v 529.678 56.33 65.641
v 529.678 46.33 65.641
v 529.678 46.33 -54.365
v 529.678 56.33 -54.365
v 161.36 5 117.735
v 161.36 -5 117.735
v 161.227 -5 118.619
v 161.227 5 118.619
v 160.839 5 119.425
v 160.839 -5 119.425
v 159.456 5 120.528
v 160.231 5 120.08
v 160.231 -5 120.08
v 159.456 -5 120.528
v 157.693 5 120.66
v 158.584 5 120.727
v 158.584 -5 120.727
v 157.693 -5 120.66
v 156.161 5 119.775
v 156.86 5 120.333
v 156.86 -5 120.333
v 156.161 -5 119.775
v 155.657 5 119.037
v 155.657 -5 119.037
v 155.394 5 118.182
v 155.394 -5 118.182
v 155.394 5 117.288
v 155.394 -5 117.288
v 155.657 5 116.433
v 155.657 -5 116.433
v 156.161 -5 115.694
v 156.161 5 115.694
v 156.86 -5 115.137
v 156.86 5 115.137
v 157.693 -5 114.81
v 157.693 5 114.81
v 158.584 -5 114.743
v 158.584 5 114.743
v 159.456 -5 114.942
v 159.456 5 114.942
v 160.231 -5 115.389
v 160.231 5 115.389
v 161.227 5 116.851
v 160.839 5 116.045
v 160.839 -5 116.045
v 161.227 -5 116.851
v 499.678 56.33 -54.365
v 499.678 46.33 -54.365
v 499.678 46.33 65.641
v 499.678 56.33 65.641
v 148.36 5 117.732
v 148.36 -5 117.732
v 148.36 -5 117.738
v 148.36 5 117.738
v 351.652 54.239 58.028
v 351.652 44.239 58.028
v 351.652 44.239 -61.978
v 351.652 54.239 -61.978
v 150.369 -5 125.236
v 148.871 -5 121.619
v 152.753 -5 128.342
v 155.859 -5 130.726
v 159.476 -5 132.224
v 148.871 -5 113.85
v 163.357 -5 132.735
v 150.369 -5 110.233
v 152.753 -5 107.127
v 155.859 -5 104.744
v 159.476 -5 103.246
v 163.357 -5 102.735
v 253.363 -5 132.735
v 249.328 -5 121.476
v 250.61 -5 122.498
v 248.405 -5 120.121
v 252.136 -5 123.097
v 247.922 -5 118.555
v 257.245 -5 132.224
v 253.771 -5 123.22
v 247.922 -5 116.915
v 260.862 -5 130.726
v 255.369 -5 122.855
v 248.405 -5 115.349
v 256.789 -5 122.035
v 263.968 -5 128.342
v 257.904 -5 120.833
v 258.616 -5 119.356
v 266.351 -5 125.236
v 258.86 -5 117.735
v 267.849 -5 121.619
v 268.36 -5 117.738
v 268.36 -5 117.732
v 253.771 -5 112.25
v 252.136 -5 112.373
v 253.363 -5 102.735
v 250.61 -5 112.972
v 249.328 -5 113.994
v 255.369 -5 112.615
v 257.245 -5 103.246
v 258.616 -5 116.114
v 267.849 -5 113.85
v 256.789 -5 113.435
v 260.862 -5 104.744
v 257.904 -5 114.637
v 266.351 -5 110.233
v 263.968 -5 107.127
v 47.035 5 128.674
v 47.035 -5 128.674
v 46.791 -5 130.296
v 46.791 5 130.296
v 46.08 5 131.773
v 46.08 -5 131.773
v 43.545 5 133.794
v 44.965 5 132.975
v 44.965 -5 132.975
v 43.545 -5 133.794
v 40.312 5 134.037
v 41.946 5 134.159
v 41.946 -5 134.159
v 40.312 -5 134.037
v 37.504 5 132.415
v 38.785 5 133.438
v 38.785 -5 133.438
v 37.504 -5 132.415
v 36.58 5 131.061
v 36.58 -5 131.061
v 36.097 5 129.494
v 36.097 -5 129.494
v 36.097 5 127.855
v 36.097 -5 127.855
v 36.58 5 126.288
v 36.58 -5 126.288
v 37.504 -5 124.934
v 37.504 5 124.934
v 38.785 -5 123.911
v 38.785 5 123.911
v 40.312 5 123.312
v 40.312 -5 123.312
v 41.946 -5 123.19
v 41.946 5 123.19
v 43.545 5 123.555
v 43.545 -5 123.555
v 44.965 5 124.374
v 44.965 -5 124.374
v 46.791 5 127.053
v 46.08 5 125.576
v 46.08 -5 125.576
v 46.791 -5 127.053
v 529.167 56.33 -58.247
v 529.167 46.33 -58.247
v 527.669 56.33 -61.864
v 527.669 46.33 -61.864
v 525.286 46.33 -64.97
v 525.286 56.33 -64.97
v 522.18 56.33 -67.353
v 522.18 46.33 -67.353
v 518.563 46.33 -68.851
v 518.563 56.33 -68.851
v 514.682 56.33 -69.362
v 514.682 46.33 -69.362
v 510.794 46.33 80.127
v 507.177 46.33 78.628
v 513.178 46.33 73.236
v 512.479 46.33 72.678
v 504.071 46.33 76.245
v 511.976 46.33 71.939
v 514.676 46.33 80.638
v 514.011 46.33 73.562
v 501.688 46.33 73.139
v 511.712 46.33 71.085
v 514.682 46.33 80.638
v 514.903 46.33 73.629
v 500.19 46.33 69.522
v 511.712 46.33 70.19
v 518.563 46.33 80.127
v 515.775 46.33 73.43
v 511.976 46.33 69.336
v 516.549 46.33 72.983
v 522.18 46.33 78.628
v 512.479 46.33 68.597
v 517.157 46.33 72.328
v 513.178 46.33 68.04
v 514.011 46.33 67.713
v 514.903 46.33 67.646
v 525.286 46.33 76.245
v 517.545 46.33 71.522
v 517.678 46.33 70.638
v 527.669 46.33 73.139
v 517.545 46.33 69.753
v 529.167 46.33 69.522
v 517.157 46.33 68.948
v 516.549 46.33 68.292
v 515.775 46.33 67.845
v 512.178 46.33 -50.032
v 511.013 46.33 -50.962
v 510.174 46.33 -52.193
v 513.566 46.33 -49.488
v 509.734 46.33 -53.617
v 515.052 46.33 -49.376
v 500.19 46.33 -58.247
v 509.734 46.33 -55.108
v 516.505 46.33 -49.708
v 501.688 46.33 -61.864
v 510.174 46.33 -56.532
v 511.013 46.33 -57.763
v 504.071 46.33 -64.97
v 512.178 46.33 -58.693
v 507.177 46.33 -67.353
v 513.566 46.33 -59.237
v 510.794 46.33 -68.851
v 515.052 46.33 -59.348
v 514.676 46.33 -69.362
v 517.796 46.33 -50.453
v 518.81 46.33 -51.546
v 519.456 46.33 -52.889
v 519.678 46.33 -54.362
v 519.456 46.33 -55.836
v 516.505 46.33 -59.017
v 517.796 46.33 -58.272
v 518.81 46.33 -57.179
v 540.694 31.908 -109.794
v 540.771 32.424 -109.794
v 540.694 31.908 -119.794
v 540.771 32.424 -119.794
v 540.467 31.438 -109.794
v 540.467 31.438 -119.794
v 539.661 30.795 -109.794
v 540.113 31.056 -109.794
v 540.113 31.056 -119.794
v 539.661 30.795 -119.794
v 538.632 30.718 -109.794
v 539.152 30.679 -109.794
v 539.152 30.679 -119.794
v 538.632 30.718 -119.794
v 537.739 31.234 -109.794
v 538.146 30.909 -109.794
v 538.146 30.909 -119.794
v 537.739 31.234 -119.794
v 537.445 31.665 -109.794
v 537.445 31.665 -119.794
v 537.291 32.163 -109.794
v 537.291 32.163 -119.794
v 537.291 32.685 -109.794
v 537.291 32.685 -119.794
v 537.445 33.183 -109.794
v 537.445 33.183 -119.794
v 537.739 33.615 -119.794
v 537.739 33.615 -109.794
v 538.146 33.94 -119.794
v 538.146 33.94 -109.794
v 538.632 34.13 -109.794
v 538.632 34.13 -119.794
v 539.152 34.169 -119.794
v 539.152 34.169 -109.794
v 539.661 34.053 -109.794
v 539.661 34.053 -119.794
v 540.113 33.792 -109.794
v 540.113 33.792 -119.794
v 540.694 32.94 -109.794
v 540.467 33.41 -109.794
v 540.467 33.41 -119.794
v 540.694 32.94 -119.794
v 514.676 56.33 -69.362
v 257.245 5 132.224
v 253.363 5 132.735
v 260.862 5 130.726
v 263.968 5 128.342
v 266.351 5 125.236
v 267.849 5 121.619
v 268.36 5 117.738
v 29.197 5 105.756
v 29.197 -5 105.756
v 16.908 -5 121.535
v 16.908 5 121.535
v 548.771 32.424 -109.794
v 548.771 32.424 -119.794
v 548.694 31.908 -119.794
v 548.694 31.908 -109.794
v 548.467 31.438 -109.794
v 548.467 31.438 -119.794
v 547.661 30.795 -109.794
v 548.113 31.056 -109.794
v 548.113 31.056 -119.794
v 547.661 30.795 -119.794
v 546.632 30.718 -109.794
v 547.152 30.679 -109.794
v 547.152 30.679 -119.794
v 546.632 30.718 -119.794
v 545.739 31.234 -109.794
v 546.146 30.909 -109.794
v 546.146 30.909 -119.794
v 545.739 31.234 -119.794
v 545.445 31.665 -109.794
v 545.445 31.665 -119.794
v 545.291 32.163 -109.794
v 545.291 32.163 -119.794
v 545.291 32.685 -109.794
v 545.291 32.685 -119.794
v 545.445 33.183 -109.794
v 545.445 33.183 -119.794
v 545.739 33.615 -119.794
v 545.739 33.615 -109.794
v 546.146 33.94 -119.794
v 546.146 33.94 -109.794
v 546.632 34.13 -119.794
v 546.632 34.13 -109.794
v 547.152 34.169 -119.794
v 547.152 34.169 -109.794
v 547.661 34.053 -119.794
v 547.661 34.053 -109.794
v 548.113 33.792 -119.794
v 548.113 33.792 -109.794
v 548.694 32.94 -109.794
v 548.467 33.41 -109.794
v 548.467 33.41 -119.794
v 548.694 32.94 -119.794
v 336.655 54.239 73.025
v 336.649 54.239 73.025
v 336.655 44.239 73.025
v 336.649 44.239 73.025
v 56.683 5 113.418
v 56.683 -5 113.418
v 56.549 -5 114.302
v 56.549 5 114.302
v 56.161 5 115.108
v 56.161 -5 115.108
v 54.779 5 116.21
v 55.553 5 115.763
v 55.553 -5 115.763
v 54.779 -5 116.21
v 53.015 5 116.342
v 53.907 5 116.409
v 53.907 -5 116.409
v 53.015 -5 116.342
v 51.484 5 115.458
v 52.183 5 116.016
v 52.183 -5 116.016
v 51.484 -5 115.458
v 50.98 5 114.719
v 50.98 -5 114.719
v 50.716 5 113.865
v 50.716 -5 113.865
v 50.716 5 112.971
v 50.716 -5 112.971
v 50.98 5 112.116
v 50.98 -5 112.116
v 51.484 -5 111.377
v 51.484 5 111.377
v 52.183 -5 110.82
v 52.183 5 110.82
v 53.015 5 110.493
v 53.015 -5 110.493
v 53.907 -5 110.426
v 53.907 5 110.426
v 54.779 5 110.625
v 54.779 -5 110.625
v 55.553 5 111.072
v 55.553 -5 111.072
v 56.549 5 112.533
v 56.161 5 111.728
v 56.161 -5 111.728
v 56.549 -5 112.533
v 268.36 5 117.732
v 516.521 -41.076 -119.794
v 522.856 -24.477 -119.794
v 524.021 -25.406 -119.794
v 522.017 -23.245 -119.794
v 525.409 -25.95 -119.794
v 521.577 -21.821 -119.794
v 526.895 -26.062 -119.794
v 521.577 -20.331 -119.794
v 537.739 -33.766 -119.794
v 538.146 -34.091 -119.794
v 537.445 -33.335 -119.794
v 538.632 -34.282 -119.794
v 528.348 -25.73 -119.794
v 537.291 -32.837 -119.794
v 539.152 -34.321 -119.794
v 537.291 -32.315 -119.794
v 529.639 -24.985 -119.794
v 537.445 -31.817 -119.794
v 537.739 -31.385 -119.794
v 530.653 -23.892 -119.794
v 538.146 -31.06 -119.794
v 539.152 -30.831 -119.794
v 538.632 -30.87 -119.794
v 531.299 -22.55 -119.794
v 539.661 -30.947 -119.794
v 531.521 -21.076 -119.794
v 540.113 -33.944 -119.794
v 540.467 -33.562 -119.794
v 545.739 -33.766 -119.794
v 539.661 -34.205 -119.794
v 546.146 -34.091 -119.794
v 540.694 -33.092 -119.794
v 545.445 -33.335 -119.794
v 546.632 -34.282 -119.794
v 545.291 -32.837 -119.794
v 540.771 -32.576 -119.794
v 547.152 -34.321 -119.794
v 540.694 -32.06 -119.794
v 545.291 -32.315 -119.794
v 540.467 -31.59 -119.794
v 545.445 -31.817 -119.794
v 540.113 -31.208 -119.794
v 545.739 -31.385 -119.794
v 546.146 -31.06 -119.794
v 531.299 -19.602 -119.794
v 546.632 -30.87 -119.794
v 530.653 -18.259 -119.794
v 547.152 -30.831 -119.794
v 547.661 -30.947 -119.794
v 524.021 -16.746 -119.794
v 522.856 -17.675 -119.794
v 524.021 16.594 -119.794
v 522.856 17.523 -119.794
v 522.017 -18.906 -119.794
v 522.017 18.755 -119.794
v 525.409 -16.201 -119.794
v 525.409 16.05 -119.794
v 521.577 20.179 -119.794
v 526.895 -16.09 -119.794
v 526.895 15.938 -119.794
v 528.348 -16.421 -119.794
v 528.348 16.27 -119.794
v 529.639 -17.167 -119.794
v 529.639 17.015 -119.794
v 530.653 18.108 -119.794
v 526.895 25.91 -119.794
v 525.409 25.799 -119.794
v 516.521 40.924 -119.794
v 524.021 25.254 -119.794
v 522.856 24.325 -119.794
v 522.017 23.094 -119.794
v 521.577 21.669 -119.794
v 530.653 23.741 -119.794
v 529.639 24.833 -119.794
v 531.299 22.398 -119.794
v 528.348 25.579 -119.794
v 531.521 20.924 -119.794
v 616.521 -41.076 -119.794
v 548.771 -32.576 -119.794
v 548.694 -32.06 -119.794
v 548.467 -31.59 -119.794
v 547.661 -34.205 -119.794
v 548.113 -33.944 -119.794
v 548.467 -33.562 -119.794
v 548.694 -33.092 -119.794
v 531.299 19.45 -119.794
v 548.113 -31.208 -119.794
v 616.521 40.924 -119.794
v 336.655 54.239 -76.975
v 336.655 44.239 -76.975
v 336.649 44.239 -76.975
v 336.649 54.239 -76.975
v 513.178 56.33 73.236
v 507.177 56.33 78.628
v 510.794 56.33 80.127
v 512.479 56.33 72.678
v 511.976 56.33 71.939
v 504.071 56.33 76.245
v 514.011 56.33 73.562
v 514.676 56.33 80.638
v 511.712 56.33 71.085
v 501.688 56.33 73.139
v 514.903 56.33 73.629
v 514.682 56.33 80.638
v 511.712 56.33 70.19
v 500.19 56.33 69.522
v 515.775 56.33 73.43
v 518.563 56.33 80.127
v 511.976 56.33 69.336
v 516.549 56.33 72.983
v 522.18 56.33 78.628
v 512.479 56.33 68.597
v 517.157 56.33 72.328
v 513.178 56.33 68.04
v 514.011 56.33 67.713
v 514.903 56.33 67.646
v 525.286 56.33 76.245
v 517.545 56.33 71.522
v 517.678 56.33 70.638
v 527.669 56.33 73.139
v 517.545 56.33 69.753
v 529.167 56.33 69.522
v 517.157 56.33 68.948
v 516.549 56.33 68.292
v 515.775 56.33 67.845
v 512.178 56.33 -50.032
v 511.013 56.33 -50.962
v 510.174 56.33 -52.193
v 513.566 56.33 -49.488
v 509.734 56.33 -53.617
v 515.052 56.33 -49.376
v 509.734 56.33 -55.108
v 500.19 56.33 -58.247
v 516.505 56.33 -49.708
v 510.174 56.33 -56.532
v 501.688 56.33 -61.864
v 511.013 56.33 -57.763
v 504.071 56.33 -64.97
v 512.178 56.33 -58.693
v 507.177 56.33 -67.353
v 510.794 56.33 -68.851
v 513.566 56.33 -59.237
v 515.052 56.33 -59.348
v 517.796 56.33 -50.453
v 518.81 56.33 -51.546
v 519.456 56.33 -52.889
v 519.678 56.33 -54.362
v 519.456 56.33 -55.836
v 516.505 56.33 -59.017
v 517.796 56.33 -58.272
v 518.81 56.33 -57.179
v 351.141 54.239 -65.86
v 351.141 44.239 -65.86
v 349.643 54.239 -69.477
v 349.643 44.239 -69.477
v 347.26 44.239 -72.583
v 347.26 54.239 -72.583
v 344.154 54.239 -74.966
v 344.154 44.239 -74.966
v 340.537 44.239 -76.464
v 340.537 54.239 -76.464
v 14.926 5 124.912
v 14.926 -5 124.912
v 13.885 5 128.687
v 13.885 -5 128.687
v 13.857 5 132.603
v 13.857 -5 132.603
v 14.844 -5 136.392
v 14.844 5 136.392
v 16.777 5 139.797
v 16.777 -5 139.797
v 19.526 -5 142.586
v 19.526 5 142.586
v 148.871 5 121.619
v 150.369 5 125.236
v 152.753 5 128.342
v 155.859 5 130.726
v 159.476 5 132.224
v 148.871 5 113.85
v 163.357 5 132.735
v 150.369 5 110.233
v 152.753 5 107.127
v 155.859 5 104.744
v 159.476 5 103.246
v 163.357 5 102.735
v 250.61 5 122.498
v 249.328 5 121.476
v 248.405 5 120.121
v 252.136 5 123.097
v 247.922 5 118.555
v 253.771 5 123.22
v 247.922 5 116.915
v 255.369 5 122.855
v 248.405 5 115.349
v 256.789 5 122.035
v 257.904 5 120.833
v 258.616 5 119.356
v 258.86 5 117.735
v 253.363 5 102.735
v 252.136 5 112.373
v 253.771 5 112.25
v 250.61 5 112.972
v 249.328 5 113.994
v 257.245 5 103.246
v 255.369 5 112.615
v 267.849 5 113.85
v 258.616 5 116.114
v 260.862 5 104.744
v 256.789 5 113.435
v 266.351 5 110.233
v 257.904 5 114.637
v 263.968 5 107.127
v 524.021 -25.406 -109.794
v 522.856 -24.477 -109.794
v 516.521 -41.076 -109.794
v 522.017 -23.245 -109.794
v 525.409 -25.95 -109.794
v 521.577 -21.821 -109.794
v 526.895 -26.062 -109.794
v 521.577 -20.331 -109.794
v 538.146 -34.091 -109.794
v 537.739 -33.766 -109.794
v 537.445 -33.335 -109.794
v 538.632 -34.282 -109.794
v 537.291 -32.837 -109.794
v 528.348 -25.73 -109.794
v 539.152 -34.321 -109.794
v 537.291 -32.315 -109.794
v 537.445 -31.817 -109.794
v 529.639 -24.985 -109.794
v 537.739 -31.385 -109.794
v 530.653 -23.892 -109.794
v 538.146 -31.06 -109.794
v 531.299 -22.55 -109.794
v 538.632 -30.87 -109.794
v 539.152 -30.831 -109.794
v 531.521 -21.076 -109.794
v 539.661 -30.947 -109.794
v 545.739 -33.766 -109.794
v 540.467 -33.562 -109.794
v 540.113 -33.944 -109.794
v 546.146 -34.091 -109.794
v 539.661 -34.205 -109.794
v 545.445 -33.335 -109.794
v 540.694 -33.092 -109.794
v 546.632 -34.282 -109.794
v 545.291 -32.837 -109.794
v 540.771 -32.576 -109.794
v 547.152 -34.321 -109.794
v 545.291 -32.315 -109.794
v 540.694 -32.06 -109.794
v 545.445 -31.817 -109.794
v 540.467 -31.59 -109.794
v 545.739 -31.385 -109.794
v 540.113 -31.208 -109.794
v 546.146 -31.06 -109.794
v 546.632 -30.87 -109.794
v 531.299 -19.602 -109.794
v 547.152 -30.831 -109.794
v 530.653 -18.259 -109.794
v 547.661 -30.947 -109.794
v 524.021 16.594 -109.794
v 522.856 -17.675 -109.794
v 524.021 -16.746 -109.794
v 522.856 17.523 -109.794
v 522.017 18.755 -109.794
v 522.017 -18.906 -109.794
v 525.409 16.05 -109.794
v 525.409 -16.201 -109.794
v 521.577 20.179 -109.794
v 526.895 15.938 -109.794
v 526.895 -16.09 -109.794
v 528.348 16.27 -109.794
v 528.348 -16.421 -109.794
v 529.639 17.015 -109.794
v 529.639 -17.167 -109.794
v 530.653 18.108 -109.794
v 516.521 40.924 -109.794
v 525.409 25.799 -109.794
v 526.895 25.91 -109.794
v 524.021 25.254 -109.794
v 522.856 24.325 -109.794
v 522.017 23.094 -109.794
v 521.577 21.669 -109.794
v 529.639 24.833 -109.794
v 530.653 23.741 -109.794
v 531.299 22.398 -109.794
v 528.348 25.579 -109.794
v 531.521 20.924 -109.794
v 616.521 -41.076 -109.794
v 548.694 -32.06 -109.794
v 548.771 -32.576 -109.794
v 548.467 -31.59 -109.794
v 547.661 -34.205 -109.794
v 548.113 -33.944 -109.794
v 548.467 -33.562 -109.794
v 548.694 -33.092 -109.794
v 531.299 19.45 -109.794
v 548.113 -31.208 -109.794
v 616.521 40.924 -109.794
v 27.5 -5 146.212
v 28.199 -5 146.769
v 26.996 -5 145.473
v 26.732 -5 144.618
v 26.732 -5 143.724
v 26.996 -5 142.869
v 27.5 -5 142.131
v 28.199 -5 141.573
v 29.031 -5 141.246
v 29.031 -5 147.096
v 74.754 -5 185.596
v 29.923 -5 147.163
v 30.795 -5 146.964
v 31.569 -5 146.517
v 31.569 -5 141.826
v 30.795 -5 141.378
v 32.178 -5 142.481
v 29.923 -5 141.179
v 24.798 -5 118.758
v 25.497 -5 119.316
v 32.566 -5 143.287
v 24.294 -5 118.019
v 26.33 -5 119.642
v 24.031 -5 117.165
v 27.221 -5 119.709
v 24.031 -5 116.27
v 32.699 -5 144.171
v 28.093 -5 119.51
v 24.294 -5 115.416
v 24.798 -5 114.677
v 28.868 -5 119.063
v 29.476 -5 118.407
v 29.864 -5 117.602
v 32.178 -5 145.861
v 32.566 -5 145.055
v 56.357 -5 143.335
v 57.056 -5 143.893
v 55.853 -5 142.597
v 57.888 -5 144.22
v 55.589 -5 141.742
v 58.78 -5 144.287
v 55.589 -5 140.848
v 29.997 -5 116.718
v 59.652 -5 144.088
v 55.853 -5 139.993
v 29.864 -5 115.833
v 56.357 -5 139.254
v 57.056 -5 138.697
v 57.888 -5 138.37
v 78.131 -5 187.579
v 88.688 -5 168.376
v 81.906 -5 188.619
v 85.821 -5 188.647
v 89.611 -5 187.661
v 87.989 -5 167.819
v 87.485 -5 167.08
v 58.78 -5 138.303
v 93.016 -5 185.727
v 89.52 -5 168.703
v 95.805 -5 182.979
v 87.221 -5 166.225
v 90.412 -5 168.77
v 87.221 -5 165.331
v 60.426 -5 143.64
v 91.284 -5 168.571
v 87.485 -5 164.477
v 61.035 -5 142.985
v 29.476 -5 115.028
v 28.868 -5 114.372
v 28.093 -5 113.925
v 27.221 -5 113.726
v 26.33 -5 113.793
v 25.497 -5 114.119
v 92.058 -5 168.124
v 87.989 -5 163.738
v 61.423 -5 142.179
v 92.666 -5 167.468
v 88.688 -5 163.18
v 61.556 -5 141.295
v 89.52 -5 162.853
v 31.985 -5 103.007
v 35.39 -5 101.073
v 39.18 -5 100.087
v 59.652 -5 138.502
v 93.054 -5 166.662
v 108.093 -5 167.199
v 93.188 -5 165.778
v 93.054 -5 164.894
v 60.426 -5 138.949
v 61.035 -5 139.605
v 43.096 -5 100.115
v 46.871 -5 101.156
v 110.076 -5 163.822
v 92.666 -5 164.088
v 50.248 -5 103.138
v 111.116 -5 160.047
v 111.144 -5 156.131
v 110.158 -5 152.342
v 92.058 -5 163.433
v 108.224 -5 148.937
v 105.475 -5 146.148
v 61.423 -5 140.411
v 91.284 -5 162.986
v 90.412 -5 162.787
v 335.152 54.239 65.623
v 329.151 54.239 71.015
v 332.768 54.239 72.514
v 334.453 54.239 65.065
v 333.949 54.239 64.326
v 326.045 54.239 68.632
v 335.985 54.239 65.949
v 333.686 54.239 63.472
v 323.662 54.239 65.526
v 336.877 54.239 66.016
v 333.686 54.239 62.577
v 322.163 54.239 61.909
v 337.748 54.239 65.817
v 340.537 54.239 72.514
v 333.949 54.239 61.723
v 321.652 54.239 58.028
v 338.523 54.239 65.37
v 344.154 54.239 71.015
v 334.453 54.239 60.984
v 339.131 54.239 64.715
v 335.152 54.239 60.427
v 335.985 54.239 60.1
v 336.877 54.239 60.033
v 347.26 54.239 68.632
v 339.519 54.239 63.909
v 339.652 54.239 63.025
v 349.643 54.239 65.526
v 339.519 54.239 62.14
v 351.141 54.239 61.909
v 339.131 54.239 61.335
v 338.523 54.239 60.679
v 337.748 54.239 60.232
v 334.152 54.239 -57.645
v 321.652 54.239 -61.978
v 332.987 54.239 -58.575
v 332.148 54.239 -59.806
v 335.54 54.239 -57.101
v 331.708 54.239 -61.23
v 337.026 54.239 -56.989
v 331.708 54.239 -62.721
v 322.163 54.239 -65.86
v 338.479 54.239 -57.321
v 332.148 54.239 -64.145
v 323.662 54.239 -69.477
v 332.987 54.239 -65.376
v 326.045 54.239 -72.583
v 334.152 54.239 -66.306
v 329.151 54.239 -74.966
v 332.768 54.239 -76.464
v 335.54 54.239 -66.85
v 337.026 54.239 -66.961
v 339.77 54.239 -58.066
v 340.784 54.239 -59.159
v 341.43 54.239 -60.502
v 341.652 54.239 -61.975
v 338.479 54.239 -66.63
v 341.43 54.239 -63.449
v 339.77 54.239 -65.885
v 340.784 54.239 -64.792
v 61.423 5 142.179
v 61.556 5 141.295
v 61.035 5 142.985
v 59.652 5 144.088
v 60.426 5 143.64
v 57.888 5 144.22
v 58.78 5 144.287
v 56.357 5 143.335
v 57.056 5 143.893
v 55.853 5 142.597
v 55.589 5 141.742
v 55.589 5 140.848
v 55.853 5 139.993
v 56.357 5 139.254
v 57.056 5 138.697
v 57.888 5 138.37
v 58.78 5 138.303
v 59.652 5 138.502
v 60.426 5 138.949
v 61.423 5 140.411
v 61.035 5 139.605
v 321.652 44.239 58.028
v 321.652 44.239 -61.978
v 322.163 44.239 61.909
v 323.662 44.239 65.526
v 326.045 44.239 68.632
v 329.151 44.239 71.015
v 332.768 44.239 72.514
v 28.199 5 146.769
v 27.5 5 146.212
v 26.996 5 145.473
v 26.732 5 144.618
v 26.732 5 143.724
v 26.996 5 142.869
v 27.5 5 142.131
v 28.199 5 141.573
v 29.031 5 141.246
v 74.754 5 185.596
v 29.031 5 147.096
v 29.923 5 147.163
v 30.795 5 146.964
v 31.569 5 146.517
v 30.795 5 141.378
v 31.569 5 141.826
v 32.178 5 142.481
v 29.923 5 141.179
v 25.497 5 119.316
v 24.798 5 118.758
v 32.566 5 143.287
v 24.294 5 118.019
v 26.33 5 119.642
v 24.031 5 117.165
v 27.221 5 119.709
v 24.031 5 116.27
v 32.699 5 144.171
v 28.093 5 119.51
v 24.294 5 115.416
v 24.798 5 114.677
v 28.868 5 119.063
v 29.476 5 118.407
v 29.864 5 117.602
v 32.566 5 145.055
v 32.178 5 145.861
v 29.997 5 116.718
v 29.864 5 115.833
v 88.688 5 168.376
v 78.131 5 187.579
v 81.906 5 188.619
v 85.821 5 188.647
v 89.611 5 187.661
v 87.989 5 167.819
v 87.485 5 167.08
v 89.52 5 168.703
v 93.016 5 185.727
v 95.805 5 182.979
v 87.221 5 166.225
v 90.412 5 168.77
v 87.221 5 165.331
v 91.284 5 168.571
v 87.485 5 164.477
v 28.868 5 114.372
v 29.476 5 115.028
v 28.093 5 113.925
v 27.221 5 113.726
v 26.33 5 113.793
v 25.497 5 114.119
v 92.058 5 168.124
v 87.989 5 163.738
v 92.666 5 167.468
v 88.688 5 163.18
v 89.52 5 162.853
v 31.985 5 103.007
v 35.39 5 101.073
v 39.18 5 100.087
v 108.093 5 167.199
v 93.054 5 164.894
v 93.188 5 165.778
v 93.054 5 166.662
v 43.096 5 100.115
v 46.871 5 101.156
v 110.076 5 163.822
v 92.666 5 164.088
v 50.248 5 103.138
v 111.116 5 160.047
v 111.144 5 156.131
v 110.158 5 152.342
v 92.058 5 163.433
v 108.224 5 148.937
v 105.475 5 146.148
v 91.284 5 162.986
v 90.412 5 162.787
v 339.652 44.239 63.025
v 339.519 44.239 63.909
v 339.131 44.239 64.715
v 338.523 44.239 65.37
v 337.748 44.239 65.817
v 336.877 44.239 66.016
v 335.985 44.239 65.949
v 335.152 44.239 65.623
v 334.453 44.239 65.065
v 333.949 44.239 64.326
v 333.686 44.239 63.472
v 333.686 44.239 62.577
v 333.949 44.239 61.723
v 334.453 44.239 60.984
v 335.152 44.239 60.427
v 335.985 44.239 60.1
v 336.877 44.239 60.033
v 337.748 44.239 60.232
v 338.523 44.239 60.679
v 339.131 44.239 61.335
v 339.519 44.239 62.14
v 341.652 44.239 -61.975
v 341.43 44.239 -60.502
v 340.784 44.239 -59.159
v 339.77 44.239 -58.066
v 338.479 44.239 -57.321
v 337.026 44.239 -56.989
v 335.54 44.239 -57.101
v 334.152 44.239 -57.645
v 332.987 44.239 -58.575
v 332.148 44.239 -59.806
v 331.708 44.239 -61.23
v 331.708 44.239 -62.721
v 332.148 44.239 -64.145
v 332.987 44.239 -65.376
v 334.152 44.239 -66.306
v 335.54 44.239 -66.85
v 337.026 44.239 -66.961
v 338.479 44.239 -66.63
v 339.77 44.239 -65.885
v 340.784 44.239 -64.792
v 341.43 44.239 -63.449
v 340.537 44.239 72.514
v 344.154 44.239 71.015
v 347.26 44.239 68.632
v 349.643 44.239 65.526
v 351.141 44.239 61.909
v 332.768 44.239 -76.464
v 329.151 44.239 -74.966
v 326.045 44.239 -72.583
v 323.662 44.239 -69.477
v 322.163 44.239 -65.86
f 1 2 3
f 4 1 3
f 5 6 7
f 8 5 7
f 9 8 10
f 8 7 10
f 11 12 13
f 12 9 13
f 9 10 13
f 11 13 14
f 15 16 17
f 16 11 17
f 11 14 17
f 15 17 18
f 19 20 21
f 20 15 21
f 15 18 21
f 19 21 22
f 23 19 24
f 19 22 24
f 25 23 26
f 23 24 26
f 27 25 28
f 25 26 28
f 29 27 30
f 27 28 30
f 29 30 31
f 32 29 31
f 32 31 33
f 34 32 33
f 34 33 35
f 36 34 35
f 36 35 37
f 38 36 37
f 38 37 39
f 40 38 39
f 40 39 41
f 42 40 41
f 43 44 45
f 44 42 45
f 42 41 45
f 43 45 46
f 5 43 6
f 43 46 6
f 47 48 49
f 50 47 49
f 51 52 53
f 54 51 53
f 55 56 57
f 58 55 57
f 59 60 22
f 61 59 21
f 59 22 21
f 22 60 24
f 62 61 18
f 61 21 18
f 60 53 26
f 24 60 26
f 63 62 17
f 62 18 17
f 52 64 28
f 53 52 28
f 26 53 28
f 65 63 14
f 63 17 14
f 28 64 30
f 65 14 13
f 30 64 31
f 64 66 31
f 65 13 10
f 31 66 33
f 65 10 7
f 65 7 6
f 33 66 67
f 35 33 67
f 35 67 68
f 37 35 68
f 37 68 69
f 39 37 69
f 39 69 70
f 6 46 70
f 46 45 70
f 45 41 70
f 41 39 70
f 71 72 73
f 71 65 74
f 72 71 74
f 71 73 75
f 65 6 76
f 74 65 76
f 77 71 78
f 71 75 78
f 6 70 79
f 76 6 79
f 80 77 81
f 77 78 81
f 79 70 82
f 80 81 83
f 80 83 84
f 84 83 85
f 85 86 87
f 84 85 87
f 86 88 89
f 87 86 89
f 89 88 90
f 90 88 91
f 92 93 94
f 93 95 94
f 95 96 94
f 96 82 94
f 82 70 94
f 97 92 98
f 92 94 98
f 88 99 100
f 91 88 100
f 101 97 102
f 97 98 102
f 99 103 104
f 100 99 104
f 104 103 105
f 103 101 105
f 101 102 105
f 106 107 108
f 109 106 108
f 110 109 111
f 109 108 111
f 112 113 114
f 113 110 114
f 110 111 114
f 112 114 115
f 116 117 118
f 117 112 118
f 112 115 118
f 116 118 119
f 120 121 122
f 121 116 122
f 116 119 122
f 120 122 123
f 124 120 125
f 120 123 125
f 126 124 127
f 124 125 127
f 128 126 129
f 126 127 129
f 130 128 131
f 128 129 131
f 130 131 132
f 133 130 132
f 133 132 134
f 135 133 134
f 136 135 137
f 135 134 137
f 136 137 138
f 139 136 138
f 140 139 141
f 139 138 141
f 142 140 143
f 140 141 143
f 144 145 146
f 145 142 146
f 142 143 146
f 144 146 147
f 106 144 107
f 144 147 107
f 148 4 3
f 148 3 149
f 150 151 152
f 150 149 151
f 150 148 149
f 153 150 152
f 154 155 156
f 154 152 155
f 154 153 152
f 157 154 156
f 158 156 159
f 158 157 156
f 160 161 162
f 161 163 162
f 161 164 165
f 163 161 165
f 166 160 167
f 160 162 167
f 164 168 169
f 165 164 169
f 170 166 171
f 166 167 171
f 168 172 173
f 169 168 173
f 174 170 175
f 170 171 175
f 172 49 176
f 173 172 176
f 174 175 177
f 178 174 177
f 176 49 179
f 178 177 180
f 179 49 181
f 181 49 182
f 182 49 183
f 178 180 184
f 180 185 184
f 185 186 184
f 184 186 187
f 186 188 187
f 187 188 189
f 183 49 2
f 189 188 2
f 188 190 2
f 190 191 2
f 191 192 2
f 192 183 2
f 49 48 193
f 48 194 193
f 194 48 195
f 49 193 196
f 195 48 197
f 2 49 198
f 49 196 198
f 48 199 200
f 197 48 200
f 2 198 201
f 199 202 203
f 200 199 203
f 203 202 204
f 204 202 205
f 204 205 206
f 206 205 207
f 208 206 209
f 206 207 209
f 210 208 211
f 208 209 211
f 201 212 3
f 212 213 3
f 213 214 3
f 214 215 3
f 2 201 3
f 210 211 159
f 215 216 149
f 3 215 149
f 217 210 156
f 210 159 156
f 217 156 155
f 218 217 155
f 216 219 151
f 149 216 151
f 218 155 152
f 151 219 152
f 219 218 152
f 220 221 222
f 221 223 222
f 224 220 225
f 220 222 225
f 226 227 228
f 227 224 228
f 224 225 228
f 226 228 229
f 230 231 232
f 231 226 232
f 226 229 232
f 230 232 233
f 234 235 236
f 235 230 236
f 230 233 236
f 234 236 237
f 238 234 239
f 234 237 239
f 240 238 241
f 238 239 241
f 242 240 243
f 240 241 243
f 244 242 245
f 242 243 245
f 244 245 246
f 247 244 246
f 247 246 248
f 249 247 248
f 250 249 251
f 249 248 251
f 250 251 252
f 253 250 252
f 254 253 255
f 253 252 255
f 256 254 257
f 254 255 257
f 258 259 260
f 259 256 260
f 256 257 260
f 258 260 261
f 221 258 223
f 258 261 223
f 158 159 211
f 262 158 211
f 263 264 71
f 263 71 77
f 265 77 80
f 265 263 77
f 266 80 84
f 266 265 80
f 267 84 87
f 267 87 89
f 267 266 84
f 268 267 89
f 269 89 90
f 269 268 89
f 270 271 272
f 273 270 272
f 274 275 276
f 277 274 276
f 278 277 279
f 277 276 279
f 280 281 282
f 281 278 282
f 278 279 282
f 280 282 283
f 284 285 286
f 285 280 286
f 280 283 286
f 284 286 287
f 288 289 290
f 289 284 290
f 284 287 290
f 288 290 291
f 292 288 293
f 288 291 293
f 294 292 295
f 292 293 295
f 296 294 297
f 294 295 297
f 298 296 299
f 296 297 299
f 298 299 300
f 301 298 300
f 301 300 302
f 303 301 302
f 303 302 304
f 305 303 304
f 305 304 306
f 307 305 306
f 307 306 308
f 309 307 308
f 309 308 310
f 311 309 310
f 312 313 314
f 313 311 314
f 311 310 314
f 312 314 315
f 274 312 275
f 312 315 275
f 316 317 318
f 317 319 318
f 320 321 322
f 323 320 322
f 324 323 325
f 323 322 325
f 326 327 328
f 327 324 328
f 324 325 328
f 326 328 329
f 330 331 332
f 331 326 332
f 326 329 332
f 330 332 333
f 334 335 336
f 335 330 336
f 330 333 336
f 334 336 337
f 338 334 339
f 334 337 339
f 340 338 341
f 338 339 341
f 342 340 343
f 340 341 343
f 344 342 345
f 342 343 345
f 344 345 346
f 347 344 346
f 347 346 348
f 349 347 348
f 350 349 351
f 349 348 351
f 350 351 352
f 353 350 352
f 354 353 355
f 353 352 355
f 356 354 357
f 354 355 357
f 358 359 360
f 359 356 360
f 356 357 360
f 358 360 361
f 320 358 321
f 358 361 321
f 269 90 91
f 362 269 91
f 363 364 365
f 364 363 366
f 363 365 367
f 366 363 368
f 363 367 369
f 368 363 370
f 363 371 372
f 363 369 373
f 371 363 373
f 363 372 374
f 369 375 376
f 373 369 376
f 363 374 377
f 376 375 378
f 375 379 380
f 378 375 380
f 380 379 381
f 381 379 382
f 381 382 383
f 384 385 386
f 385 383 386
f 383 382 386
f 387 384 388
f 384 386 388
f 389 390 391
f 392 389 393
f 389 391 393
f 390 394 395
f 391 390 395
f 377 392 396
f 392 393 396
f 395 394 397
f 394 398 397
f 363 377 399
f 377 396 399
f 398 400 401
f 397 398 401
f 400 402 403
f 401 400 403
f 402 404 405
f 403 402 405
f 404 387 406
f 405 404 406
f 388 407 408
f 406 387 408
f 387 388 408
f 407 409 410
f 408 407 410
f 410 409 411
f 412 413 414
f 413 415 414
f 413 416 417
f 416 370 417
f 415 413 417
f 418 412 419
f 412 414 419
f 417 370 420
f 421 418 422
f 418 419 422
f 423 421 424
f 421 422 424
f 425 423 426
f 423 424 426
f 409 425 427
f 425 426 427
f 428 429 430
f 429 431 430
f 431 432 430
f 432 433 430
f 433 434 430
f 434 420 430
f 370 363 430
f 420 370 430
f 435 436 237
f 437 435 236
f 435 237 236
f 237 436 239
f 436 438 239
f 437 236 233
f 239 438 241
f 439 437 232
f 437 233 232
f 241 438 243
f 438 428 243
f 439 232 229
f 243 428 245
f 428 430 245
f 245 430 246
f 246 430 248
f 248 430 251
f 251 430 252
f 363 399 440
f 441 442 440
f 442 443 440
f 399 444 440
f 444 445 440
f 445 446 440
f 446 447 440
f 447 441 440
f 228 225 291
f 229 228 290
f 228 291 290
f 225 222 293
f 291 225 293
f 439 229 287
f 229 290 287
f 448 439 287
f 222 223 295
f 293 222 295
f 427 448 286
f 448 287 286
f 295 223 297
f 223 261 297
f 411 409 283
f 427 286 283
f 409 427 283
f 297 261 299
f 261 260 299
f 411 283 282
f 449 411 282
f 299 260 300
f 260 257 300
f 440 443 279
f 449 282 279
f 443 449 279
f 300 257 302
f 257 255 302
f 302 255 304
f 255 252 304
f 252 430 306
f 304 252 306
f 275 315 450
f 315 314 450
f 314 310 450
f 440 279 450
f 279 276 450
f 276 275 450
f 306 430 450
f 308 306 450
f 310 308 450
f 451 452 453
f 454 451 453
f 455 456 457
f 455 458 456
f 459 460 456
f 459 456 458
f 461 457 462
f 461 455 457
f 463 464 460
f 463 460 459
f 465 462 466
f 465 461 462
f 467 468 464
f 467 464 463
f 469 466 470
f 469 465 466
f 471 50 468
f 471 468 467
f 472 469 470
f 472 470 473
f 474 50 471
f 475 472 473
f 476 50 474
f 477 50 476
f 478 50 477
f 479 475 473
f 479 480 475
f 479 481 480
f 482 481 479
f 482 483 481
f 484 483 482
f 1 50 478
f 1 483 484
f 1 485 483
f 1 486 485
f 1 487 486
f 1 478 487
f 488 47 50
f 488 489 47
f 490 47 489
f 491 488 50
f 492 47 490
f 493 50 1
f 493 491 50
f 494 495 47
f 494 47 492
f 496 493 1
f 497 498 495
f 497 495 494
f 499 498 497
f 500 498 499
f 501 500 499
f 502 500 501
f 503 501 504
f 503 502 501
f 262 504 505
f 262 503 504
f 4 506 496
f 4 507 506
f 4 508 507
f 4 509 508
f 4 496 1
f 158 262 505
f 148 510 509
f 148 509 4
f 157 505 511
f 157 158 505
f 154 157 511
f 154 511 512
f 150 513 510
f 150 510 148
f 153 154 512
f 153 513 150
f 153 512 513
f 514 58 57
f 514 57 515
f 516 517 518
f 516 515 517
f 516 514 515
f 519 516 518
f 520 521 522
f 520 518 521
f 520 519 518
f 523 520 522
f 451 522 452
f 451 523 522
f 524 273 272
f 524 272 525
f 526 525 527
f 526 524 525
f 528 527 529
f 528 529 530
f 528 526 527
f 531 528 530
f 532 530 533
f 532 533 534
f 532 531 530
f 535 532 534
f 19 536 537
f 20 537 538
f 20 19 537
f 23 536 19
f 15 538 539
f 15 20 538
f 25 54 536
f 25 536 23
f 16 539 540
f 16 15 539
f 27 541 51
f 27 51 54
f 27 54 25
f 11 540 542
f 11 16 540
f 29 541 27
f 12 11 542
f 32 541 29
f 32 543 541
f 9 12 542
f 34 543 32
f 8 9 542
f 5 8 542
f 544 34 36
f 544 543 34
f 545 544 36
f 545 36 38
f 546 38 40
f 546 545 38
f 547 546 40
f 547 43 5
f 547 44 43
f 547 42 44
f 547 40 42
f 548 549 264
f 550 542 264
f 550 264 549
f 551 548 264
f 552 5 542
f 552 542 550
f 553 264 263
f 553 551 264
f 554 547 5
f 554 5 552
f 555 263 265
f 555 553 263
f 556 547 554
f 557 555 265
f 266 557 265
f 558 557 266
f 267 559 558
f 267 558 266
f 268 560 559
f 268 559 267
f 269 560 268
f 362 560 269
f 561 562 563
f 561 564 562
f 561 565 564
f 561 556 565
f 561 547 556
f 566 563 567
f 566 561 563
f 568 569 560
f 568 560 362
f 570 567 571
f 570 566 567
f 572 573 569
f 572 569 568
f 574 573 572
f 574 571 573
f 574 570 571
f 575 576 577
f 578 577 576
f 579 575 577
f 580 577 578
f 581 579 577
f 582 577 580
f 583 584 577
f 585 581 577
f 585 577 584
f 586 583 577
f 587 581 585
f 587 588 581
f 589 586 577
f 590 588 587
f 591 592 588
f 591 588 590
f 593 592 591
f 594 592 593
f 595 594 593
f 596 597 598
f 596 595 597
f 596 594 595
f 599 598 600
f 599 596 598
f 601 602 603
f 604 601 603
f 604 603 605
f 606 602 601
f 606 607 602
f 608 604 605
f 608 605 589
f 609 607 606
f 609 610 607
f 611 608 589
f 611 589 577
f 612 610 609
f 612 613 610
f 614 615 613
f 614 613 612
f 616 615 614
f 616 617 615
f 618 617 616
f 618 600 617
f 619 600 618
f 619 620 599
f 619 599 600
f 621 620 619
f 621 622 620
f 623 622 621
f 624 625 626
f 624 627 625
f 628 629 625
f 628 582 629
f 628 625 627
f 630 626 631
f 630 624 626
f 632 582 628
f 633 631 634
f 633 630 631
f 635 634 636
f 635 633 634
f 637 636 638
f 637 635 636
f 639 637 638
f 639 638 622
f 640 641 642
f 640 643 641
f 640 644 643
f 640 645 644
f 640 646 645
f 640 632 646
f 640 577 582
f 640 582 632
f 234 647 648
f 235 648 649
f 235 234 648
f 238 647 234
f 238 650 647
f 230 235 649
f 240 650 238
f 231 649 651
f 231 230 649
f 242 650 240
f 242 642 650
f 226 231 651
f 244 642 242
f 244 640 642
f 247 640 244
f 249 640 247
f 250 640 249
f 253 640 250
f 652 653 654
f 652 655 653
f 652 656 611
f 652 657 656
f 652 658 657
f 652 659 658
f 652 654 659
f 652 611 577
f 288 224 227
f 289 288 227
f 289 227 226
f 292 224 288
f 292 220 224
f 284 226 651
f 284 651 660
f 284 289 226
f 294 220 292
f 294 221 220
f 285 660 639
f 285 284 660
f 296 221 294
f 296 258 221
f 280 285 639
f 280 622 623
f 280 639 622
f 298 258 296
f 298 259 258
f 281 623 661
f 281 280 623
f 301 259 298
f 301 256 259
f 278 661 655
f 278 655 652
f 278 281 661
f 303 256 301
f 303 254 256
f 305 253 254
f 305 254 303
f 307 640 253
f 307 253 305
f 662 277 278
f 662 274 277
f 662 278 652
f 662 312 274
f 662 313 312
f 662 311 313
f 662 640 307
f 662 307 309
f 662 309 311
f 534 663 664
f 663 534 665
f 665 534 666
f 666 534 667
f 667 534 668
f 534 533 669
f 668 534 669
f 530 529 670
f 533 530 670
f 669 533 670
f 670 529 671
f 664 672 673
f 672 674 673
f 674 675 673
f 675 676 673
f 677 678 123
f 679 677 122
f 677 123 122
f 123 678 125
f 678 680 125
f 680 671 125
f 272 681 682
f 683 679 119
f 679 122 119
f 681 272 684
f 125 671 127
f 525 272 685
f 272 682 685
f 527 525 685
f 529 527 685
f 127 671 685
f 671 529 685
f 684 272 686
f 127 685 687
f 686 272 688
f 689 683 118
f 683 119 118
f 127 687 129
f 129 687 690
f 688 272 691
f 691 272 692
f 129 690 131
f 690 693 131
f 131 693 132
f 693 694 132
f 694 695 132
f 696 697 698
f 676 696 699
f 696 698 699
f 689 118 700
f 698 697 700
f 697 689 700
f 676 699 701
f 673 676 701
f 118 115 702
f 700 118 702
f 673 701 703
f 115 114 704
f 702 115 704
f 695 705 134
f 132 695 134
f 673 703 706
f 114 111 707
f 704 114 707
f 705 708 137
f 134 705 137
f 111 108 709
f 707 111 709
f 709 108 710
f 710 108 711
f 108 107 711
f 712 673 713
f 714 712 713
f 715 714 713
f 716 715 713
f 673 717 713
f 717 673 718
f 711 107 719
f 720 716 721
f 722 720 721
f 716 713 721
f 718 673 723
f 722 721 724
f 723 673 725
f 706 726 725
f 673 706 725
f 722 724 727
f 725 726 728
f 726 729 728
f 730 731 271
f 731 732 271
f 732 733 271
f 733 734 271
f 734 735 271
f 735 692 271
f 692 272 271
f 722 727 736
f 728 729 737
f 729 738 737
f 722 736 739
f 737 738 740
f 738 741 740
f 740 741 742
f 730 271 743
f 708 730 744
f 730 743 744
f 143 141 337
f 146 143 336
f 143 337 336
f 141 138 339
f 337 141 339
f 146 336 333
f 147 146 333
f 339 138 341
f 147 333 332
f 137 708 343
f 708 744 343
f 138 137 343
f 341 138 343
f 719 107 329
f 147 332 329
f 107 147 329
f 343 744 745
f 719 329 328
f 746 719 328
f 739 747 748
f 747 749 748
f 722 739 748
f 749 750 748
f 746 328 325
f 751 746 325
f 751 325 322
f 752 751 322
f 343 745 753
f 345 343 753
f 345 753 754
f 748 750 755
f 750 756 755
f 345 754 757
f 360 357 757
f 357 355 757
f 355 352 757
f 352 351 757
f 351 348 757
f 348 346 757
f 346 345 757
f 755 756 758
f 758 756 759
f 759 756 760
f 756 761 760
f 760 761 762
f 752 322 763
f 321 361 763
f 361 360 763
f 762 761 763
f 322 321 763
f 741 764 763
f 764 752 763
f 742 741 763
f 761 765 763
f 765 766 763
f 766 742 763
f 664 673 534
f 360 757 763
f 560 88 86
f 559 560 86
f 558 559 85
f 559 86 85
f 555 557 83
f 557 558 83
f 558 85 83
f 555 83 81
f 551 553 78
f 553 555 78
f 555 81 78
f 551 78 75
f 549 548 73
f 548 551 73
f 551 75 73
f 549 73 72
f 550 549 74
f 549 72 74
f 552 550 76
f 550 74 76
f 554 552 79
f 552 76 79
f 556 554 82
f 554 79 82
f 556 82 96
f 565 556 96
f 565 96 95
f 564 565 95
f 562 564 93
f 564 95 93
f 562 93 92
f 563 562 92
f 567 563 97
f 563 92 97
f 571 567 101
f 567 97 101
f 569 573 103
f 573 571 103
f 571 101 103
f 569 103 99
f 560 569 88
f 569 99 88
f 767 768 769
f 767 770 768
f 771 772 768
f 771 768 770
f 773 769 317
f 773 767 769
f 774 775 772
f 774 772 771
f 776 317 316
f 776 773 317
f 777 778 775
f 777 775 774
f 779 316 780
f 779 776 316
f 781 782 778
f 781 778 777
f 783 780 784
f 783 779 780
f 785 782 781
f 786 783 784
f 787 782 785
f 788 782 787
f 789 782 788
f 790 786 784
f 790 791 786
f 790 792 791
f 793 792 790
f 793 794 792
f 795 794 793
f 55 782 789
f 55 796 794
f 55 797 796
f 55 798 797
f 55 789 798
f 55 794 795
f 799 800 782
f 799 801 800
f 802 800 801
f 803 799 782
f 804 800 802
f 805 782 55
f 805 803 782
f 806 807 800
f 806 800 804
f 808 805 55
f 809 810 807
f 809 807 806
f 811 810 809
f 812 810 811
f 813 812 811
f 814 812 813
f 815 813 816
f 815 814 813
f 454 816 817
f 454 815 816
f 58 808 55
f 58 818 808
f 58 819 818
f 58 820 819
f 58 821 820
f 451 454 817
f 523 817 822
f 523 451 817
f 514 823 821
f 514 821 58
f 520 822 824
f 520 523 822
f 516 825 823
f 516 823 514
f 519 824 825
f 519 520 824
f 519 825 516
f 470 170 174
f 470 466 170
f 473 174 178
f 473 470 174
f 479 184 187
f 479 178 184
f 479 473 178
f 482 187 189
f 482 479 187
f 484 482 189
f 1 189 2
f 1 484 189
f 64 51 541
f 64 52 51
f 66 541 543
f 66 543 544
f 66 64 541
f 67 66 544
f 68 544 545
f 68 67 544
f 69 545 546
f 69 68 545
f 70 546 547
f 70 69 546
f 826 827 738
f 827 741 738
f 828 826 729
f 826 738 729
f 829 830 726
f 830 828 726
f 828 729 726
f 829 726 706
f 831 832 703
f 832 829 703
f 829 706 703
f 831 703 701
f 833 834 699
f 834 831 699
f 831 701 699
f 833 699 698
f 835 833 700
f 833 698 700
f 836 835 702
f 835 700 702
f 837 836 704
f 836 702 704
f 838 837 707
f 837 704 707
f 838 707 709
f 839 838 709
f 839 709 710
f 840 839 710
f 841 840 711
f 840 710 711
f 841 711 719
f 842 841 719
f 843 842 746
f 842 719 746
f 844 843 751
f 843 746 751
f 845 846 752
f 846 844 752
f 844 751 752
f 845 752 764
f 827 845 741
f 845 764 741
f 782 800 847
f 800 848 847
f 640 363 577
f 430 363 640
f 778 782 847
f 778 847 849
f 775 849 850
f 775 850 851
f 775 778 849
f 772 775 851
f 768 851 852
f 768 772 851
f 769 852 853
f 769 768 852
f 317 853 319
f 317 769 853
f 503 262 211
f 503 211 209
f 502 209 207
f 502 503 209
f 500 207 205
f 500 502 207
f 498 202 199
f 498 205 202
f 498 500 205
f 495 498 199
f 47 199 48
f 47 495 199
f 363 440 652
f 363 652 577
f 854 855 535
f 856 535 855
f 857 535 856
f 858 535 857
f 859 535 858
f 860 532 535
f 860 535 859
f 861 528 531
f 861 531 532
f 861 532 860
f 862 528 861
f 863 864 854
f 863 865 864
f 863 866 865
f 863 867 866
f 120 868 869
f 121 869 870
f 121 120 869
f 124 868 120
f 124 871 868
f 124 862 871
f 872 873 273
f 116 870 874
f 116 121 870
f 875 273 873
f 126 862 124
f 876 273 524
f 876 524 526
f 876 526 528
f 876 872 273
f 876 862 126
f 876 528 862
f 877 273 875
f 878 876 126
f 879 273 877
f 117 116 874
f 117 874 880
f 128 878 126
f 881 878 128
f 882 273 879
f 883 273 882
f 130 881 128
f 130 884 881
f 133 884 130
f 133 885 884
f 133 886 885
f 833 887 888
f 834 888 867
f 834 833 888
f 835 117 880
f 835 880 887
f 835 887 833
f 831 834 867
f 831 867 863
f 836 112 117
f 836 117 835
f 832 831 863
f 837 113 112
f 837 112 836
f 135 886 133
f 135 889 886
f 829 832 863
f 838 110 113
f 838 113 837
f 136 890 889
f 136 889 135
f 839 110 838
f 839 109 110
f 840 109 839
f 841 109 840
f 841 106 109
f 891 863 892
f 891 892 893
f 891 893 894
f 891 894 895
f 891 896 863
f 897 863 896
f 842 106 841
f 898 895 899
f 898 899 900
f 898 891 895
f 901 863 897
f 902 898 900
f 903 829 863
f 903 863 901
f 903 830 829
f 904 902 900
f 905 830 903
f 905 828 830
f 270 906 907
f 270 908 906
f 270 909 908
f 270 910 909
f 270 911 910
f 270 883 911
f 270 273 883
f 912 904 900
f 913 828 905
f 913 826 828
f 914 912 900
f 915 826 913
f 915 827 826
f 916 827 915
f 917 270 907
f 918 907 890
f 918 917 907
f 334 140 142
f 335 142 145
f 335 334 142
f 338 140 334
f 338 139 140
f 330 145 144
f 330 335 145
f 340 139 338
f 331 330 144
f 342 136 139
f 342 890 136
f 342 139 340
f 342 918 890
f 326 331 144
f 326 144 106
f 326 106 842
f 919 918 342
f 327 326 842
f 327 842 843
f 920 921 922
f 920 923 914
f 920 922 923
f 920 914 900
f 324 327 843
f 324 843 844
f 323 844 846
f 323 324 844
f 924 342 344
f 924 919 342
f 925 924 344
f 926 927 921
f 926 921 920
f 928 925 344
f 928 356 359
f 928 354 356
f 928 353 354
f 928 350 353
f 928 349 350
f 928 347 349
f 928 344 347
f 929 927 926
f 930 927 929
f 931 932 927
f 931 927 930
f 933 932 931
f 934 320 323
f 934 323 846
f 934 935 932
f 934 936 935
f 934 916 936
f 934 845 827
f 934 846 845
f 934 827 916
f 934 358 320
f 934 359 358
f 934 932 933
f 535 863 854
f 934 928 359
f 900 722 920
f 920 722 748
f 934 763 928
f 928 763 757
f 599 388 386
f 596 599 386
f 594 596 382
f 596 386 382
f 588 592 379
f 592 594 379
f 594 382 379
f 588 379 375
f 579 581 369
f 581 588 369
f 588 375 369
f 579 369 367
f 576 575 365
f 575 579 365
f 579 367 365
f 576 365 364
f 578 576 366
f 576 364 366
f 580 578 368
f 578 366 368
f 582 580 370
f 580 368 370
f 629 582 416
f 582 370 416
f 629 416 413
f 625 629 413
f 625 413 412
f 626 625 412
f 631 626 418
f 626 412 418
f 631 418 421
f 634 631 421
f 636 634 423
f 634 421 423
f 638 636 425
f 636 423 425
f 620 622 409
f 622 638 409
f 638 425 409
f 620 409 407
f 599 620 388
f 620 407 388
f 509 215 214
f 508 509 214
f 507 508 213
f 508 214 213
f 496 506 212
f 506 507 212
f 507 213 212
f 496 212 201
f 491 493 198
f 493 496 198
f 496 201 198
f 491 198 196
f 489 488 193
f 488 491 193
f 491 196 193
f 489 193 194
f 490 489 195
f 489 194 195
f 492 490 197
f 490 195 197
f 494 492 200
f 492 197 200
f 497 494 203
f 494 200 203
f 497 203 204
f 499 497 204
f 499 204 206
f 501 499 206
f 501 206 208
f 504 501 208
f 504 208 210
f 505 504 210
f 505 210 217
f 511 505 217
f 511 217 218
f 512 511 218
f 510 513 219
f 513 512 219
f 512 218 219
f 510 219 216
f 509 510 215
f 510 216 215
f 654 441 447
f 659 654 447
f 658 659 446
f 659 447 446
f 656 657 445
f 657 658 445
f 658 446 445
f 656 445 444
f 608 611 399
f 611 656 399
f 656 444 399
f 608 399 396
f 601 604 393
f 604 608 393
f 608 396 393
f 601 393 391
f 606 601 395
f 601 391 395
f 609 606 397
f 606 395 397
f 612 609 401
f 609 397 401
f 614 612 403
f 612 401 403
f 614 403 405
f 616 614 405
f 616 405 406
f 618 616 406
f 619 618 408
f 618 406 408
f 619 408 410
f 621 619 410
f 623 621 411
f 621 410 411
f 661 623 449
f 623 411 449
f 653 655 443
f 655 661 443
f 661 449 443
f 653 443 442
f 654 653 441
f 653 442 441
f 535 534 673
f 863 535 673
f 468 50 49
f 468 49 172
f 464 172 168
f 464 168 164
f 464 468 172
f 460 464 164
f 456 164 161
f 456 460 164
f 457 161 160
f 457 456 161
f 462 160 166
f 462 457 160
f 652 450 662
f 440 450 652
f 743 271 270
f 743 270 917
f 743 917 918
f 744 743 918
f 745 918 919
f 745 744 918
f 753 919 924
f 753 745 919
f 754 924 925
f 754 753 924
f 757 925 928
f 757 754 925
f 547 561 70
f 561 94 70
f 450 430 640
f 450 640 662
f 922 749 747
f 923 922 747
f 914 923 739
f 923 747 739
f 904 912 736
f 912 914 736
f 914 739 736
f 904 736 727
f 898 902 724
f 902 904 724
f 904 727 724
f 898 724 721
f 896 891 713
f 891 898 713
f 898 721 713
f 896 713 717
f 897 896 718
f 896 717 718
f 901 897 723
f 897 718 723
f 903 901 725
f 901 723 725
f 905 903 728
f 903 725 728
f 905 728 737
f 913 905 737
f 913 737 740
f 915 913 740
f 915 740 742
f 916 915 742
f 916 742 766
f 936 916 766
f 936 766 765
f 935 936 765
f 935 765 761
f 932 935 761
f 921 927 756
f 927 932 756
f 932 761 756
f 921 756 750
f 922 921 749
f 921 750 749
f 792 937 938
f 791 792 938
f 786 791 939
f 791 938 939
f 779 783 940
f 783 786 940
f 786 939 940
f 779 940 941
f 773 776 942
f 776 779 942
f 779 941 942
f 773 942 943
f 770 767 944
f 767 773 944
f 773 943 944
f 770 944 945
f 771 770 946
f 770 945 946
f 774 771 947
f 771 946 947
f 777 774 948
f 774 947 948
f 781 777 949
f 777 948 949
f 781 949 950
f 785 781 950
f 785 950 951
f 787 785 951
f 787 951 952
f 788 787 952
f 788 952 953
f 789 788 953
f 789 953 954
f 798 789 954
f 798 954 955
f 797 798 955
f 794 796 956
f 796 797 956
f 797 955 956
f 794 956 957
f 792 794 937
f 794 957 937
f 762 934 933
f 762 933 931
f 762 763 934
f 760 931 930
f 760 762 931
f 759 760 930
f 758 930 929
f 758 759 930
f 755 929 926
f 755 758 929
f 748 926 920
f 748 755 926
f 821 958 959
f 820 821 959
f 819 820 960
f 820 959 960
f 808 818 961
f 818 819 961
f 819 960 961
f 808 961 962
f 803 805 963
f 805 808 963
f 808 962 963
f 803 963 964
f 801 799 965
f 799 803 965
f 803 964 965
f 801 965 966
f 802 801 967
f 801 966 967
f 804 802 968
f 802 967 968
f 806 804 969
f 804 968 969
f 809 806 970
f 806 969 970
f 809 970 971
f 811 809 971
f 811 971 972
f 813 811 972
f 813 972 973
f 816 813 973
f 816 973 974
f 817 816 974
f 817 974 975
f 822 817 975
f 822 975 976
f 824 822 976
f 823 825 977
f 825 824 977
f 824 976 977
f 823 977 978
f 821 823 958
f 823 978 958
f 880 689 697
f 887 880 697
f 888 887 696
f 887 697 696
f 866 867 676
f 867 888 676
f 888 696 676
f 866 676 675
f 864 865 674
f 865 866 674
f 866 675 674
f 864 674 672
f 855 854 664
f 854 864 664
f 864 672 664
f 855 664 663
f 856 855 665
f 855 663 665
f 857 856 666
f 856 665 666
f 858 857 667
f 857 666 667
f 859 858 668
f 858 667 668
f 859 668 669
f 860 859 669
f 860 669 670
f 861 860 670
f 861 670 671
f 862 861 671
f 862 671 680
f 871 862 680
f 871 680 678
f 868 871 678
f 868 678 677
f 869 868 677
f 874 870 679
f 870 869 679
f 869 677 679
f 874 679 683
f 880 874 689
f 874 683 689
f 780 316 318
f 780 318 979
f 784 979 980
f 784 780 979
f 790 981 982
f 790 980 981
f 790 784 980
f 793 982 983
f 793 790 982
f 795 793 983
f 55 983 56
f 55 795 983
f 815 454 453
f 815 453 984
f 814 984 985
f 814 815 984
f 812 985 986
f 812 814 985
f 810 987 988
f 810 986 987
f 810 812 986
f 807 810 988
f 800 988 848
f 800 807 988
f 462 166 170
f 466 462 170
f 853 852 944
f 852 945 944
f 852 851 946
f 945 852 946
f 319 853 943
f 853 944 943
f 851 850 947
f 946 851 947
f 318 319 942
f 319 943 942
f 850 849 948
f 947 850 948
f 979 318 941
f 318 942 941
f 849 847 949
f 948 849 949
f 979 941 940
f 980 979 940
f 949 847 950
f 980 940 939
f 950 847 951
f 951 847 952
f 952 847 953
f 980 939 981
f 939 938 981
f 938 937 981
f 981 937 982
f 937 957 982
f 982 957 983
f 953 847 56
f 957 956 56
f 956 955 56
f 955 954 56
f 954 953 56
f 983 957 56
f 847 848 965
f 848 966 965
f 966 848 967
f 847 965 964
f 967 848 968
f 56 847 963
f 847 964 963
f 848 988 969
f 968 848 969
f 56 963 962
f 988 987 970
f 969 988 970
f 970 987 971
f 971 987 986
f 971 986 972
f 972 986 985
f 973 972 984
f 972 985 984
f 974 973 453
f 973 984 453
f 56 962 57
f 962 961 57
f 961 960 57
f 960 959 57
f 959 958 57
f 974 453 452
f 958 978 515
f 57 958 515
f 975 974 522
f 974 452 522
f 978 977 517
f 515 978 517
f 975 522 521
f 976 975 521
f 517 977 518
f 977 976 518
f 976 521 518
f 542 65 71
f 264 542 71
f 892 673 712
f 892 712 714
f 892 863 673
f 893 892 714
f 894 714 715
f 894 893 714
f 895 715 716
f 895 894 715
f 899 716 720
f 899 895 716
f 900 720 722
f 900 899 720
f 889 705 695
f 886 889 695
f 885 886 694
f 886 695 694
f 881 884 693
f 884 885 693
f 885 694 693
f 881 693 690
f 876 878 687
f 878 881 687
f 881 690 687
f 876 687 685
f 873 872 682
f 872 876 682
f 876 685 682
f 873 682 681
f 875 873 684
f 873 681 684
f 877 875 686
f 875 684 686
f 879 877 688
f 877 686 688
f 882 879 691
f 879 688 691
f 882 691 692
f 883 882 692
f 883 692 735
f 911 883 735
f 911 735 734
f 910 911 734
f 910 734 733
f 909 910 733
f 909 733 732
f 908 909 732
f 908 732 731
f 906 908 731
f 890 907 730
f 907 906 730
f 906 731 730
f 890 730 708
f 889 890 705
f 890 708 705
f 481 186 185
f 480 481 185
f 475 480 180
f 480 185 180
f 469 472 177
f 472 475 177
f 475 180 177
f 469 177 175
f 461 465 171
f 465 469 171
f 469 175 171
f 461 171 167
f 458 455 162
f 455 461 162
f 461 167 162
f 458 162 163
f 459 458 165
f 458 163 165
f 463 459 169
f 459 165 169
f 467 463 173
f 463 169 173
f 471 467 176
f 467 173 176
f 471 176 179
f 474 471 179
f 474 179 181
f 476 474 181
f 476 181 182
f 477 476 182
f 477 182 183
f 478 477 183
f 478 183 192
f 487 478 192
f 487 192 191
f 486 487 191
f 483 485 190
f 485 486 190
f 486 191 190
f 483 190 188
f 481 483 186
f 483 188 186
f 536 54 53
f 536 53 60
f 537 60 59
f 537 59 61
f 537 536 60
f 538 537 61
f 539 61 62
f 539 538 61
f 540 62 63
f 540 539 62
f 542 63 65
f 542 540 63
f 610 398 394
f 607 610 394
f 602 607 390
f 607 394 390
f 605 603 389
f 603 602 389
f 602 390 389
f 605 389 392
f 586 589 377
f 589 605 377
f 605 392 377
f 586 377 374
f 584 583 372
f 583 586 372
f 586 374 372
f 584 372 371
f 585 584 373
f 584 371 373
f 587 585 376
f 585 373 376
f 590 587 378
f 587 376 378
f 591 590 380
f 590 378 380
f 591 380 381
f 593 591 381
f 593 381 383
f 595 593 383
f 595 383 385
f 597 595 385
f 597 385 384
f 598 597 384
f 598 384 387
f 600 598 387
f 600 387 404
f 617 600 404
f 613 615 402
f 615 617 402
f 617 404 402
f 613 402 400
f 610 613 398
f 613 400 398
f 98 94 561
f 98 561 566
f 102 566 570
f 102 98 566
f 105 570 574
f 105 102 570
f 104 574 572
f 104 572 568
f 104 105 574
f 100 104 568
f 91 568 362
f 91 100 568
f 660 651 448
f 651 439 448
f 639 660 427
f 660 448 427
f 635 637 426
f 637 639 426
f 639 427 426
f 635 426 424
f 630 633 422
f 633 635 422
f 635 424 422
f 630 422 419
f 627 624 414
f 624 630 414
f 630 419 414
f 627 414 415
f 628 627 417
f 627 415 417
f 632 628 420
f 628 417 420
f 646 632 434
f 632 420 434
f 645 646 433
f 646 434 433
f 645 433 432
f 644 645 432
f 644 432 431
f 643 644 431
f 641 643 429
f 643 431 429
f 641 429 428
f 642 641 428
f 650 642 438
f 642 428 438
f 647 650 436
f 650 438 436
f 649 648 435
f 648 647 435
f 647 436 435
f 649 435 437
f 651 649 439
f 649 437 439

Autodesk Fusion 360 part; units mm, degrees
sketch "Sketch19" plane through (0, 0, 0) normal (0, 1, 0) x (1, 0, 0)
  line L0 (-204.4398, 88.4329) -> (-125.5431, 26.9894)
  line L1 (-125.5431, 26.9894) -> (-94.8213, 66.4377)
  line L2 (-94.8213, 66.4377) -> (-173.7181, 127.8812)
  line L3 (-173.7181, 127.8812) -> (-204.4398, 88.4329)
  circle A0 centre (-185.1341, 105.0849) radius 3
  circle A1 centre (-182.4324, 77.6313) radius 3
  circle A2 centre (-153.5754, 80.5075) radius 3
  circle A3 centre (-158.4486, 108.3847) radius 3
  circle A4 centre (-121.9436, 56.0242) radius 3
  circle A5 centre (-170.5959, 93.1279) radius 5.5
  dimension "d188" = 50
  dimension "d189" = 100
  dimension "d190" = 6
  dimension "d191" = 6
  dimension "d192" = 6
  dimension "d193" = 6
  dimension "d194" = 40
  dimension "d195" = 25
  dimension "d196" = 25
  dimension "d197" = 39
  dimension "d198" = 5
  dimension "d199" = 24
  dimension "d200" = 5
  dimension "d201" = 6
  dimension "d202" = 40
  dimension "d227" = 11
  dimension "d228" = 19.5
extrude "Extrude1" add sketch "Sketch19" along normal mid plane 10 makes body 1 in component "Link 1"
fillet "Fillet2" radius 15 4 edges at (-204.4398, 0, -88.4329) (-125.5431, 0, -26.9894) (-173.7181, 0, -127.8812) (-94.8213, 0, -66.4377) on bodies 1 in component "Link 1"
sketch "Sketch20" plane through (0, 0, 0) normal (0, 1, 0) x (1, 0, 0)
  line L0 (-230, -110) -> (-110, -110)
  line L1 (-110, -110) -> (-110, -80)
  line L2 (-110, -80) -> (-230, -80)
  line L3 (-230, -80) -> (-230, -110)
  circle A0 centre (-220, -95) radius 3
  circle A1 centre (-125, -95) radius 5.5
  dimension "d205" = 120
  dimension "d206" = 30
  dimension "d207" = 6
  dimension "d208" = 15
  dimension "d209" = 10
  dimension "d325" = 11
  dimension "d326" = 15
extrude "Extrude1'" add sketch "Sketch20" along normal mid plane 10 separate body makes body 2 in component "Link 2"
fillet "Fillet1" radius 15 4 edges at (-230, 0, 80) (-230, 0, 110) (-110, 0, 110) (-110, 0, 80) on bodies 2 in component "Link 2"
sketch "Sketch1" plane through (0, 0, 0) normal (0, 1, 0) x (1, 0, 0) in component "MDholder"
  line L0 (70, 30) -> (100, 30)
  line L1 (100, 30) -> (100, 180)
  line L2 (100, 180) -> (70, 180)
  line L3 (70, 180) -> (70, 30)
  circle A0 centre (85, 40) radius 3
  circle A1 centre (85, 165) radius 5
  dimension "d253" = 150
  dimension "d254" = 6
  dimension "d262" = 10
  dimension "d327" = 10
  dimension "d328" = 15
extrude "Extrude1''" add sketch "Sketch1" along normal blind 10 separate body makes body 3 in component "MDholder"
fillet "Fillet1'" radius 15 4 edges at (100, 5, -30) (100, 5, -180) (70, 5, -180) (70, 5, -30) on bodies 3 in component "MDholder"
sketch "Sketch1 (2)" plane through (0, 0, 0) normal (0, 1, 0) x (1, 0, 0) in component "holder2"
  line L0 (160, 30) -> (190, 30)
  line L1 (190, 30) -> (190, 180)
  line L2 (190, 180) -> (160, 180)
  line L3 (160, 180) -> (160, 30)
  circle A0 centre (175, 40) radius 3
  circle A1 centre (175, 165) radius 5
  dimension "d259" = 30
  dimension "d260" = 150
  dimension "d261" = 6
  dimension "d263" = 10
  dimension "d329" = 10
  dimension "d330" = 15
extrude "Extrude1'''" add sketch "Sketch1 (2)" along normal blind 10 separate body makes body 4 in component "holder2"
fillet "Fillet1''" radius 15 4 edges at (190, 5, -30) (190, 5, -180) (160, 5, -30) (160, 5, -180) on bodies 4 in component "holder2"
sketch "Sketch1 (3)" plane through (0, 0, 0) normal (0, 0, 1) x (1, 0, 0) in component "MD"
  line L0 (200, 150) -> (300, 150)
  line L1 (300, 150) -> (300, 68)
  line L2 (300, 68) -> (200, 68)
  line L3 (200, 68) -> (200, 150)
  circle A0 centre (222.5, 76.5) radius 1.75
  circle A1 centre (222.5, 141.5) radius 1.75
  circle A2 centre (230.5, 141.5) radius 1.75
  circle A3 centre (230.5, 76.5) radius 1.75
  circle A4 centre (210, 88) radius 5
  circle A5 centre (210, 130) radius 5
  dimension "d268" = 100
  dimension "d269" = 82
  dimension "d270" = 3.5
  dimension "d271" = 22.5
  dimension "d272" = 8.5
  dimension "d273" = 3.5
  dimension "d274" = 8.5
  dimension "d275" = 3.5
  dimension "d276" = 8
  dimension "d277" = 3.5
  dimension "d278" = 8
  dimension "d320" = 10
  dimension "d321" = 20
  dimension "d322" = 10
  dimension "d323" = 10
  dimension "d324" = 20
extrude "Extrude1''''" add sketch "Sketch1 (3)" along normal blind 10 separate body makes body 5 in component "MD"
component "Link 1" placed x (1, 0, 0) y (0, 1, 0) z (0, 0, 1) at (212.1313, 0, 221.8024)
component "Link 2" placed x (1, 0, 0) y (0, 1, 0) z (0, 0, 1) at (378.3601, 0, 22.7349)
component "MDholder" placed x (1, 0, 0) y (0, 1, 0) z (0, 0, 1) at (251.6524, 44.2391, 103.0246)
component "holder2" placed x (1, 0, 0) y (0, 1, 0) z (0, 0, 1) at (339.6785, 46.3297, 110.6376)
component "MD" placed x (1, 0, 0) y (0, 1, 0) z (0, 0, 1) at (316.5214, -109.0758, -119.7935)
